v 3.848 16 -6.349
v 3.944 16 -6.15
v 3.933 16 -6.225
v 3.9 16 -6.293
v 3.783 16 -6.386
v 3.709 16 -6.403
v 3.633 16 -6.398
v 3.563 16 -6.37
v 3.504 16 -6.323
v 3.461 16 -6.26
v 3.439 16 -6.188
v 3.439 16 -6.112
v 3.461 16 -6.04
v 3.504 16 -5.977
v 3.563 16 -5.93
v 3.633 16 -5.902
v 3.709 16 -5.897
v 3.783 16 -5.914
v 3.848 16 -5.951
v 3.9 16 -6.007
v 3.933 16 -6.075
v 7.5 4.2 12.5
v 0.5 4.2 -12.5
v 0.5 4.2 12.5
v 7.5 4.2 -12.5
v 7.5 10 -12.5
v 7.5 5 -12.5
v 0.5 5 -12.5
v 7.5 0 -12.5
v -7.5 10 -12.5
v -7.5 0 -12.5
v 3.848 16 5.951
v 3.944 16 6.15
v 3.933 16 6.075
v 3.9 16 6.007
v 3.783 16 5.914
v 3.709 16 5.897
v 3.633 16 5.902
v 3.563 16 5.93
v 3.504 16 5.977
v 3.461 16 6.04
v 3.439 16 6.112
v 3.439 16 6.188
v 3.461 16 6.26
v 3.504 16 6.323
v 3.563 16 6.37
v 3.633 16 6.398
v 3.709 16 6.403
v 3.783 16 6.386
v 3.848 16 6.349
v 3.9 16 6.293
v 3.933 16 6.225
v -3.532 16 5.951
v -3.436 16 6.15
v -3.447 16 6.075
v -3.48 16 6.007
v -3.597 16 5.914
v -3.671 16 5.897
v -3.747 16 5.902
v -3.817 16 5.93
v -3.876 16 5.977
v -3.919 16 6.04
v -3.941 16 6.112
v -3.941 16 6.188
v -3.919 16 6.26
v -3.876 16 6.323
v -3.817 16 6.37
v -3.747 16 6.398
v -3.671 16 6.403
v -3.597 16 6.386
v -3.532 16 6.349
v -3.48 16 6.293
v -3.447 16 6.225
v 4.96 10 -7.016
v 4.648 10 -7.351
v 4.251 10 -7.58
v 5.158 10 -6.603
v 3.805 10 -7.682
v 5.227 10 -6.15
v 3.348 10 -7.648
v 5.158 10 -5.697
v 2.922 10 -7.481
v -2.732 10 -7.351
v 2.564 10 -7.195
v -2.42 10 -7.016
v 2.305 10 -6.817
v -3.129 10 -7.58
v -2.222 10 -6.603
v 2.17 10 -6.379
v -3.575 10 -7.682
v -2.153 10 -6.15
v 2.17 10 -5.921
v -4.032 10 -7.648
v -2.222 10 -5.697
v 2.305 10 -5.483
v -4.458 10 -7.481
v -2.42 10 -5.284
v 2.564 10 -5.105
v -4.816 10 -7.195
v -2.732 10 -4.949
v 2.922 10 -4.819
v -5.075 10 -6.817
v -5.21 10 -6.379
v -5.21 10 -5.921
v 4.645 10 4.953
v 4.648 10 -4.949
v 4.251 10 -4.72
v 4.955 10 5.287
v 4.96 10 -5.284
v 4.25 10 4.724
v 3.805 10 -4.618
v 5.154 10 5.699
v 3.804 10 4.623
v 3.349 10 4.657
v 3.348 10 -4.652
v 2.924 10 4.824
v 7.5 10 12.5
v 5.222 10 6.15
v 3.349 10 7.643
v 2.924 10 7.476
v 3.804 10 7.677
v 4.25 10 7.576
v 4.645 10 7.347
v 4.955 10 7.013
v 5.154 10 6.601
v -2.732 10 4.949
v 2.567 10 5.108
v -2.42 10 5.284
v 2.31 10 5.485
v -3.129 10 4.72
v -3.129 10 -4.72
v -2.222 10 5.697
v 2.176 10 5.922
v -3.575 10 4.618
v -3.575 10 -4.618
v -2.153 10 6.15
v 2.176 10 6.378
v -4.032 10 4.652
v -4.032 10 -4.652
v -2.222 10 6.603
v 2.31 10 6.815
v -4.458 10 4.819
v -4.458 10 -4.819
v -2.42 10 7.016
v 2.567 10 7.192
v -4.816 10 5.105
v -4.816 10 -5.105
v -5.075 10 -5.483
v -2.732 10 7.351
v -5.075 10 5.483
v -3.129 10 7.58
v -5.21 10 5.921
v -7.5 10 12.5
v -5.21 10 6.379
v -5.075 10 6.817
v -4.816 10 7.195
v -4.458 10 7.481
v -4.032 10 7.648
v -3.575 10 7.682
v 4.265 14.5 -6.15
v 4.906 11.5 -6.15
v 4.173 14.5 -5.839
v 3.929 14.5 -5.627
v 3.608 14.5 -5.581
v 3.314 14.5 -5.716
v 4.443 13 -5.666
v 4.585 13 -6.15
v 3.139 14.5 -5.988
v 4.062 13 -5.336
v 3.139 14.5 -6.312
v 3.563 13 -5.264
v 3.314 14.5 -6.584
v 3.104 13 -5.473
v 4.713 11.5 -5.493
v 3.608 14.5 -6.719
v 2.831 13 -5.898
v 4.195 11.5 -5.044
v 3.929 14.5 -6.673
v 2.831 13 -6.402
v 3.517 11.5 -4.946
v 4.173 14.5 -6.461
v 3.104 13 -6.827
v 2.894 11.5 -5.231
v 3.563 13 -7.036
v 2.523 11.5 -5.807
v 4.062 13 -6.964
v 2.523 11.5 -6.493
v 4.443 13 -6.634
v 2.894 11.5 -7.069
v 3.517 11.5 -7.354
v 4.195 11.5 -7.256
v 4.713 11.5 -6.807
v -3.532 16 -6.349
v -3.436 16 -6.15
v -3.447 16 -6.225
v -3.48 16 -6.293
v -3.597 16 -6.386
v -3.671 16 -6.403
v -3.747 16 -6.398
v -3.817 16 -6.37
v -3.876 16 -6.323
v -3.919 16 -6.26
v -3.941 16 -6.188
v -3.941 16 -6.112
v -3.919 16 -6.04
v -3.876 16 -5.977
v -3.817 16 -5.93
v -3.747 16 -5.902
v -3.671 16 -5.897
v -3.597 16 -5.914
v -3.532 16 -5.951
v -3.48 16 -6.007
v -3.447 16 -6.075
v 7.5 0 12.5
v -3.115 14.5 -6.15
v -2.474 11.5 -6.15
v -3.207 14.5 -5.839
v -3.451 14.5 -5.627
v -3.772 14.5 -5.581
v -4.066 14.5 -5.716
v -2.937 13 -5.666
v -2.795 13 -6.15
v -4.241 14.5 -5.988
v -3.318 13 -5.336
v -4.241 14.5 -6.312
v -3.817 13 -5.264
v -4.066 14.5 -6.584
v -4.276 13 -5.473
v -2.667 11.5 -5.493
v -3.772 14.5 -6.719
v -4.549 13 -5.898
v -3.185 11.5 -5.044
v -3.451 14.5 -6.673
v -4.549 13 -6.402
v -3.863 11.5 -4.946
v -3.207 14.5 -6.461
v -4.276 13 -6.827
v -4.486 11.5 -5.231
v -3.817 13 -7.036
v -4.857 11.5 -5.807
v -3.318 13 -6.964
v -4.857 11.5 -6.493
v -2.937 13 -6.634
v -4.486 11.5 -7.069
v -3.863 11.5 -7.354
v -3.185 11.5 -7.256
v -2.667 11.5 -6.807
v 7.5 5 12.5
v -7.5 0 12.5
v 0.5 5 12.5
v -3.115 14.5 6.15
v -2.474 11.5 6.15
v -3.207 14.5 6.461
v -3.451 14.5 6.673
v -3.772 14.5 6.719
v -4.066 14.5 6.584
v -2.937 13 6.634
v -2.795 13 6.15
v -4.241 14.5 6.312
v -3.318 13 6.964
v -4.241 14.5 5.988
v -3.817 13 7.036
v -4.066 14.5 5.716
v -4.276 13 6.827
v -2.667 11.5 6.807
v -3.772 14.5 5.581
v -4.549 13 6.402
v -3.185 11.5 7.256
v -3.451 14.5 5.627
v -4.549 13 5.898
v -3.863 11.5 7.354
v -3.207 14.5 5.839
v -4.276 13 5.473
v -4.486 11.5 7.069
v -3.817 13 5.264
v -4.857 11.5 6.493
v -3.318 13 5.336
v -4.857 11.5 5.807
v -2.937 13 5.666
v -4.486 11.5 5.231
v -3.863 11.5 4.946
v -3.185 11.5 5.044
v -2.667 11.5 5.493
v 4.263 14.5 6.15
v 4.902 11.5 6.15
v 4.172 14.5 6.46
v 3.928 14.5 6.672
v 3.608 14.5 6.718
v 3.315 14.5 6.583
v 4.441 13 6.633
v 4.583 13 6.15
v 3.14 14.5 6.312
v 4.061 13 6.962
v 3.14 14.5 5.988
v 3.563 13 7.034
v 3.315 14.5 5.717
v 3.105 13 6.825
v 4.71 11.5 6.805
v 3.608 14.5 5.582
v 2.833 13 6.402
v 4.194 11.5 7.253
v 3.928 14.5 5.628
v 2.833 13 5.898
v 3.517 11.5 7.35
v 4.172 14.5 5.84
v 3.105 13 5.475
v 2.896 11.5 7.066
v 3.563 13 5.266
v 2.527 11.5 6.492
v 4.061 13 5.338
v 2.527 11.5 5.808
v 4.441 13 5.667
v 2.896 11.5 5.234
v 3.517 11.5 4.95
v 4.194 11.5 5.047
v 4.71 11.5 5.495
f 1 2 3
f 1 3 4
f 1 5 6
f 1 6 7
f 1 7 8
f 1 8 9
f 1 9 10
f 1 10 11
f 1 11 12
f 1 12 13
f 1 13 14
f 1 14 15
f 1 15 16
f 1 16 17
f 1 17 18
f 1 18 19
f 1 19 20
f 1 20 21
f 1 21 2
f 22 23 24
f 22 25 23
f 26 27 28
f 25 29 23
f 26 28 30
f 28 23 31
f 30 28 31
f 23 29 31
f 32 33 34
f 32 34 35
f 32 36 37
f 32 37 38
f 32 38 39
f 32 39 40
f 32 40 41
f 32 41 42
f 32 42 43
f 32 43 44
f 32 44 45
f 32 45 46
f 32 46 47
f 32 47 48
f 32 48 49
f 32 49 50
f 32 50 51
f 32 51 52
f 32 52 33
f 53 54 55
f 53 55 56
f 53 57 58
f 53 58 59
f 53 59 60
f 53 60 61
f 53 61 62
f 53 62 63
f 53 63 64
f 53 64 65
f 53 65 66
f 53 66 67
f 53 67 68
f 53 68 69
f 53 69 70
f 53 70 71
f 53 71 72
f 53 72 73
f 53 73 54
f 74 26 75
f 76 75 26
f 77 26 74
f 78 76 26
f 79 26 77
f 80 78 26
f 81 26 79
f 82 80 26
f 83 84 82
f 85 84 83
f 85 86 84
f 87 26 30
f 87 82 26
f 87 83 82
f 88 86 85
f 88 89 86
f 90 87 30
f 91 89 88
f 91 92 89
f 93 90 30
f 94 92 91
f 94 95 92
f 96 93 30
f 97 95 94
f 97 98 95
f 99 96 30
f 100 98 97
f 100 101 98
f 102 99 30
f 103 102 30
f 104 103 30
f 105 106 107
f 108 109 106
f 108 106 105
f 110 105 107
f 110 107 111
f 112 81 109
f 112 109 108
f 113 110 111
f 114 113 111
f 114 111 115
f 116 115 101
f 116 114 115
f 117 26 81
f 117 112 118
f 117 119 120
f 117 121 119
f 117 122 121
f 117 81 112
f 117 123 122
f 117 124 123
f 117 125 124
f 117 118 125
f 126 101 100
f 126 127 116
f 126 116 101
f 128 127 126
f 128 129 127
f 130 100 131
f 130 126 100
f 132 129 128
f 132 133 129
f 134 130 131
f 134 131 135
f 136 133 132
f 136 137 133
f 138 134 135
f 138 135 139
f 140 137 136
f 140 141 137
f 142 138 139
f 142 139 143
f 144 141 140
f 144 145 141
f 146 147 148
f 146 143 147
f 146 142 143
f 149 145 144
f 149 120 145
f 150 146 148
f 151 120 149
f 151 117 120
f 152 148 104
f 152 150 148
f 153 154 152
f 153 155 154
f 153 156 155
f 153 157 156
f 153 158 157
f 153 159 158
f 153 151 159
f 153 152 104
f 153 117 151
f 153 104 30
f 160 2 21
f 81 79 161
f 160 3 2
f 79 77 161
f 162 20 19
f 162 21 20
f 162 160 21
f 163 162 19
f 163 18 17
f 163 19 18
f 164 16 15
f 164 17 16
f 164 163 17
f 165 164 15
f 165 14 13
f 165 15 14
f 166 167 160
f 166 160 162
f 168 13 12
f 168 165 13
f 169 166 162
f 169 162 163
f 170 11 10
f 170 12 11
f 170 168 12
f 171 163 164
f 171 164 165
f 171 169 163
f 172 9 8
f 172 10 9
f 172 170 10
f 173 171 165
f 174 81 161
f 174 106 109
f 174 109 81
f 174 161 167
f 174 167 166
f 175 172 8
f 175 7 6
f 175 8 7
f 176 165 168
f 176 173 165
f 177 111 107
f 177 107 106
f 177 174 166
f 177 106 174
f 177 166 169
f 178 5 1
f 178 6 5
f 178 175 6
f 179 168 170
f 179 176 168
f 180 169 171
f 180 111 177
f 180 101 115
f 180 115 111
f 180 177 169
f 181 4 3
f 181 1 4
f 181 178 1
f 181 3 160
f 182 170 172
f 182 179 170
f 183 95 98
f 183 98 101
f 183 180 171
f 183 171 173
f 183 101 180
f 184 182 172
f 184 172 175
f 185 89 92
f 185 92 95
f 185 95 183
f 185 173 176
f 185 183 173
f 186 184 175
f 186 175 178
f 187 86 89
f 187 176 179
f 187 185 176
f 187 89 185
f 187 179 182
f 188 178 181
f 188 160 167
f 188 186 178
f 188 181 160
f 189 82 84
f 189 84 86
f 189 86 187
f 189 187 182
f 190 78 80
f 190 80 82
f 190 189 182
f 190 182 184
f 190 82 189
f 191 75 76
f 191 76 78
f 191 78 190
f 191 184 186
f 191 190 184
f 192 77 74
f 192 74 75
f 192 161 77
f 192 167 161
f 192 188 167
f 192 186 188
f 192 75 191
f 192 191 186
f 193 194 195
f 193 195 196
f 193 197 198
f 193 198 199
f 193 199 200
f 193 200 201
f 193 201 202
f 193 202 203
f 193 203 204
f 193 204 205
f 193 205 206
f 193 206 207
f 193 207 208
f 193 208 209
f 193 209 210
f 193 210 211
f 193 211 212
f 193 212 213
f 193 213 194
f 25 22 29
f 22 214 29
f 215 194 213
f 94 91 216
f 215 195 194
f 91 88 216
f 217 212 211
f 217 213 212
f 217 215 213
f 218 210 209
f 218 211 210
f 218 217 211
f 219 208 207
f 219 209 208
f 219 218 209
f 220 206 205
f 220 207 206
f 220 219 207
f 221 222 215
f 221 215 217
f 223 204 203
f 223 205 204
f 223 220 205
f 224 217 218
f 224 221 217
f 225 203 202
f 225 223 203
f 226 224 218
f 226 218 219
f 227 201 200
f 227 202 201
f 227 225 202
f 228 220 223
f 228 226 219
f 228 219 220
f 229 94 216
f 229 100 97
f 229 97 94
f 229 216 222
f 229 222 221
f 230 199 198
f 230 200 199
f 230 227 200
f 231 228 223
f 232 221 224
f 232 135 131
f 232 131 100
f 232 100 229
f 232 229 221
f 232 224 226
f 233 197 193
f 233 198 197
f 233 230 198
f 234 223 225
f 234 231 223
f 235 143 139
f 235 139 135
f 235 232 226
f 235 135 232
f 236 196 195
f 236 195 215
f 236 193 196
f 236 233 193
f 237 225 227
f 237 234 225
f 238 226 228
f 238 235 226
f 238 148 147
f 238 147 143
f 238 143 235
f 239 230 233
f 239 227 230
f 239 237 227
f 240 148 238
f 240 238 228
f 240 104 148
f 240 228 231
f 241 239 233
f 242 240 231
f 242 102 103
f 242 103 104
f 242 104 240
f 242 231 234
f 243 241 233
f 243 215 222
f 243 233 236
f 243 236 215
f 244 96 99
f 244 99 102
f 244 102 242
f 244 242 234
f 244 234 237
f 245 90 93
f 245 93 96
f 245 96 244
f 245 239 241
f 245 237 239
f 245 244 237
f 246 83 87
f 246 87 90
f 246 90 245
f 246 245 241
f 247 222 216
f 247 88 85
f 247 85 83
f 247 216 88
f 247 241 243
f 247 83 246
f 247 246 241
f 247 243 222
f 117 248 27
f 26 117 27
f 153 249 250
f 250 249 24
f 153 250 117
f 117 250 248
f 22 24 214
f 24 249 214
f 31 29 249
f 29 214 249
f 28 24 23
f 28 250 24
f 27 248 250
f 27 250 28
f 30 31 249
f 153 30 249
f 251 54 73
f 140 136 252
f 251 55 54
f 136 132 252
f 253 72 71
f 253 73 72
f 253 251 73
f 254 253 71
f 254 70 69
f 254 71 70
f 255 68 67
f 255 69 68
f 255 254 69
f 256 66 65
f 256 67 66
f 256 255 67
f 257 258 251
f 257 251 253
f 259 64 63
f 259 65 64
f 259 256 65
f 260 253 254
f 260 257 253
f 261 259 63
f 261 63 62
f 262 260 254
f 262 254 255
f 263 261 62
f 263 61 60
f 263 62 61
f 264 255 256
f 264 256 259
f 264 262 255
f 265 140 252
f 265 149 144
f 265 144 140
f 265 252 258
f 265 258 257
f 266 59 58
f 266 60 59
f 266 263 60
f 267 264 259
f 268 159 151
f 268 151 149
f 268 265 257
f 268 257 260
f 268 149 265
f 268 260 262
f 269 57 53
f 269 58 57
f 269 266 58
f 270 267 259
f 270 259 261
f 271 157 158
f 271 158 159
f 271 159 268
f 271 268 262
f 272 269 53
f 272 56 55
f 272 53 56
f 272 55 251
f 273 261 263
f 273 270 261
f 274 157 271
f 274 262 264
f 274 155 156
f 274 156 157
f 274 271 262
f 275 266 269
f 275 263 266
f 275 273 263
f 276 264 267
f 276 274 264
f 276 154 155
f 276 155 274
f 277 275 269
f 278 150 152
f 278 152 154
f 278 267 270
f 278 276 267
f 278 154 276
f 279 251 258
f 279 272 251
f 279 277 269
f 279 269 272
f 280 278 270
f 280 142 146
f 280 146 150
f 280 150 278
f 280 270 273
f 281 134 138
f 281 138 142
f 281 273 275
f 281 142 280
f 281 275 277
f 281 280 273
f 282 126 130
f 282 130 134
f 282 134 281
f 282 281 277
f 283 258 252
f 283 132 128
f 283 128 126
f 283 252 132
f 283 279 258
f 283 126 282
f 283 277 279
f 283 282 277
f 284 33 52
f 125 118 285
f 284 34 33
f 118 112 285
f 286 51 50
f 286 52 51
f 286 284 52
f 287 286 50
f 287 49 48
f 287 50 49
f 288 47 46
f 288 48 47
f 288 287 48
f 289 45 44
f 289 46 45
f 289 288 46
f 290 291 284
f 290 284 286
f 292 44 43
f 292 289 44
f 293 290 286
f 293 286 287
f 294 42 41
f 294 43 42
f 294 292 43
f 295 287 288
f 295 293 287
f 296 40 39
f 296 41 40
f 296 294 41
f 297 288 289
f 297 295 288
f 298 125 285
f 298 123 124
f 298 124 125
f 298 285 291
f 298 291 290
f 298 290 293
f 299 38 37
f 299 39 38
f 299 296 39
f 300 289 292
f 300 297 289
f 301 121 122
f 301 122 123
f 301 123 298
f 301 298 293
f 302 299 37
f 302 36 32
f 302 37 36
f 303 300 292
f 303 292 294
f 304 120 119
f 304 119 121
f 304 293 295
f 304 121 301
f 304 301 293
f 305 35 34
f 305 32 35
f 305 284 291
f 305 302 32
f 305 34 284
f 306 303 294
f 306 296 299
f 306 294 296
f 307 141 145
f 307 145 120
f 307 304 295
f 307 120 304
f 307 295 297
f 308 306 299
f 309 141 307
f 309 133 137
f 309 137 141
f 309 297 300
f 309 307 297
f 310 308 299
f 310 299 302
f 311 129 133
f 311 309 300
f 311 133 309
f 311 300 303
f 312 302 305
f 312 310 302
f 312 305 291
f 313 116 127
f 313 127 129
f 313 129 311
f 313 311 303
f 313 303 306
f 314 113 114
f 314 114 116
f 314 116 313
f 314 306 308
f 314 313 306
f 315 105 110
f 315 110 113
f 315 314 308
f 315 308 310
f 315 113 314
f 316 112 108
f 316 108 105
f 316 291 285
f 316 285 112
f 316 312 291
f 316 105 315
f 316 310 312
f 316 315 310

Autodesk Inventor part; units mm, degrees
ref_plane "YZ Plane" through (0, 0, 0) normal (1, 0, 0) x (0, 1, 0)
ref_plane "XZ Plane" through (0, 0, 0) normal (0, 1, 0) x (-1, 0, 0)
ref_plane "XY Plane" through (0, 0, 0) normal (0, 0, 1) x (1, 0, 0)
sketch "Sketch1" plane through (0, 0, 0) normal (0, 1, 0) x (-1, 0, 0)
  line L0 (7.5, 12.5) -> (-7.5, 12.5)
  line L1 (-7.5, 12.5) -> (-7.5, -12.5)
  line L2 (-7.5, -12.5) -> (7.5, -12.5)
  line L3 (7.5, -12.5) -> (7.5, 12.5)
  point P0 (0, 0)
  dimension "d0" = 25
  dimension "d1" = 15
  dimension "d2" = 7.5
  dimension "d3" = 12.5
extrude "Extrusion1" add sketch "Sketch1" along normal blind 10
sketch "Sketch3" plane through (7.5, 0, 12.5) normal (1, 0, 0) x (0, 0, -1)
  line L0 (0, 0) -> (0, 10) projected
  line L1 (0, 5) -> (25, 5)
  line L2 (25, 5) -> (25, 4.2)
  line L3 (25, 4.2) -> (0, 4.2)
  line L4 (0, 4.2) -> (0, 5)
  point P0 (12.5, 0)
  dimension "d8" = 0.8
  dimension "d9" = 25
extrude "Extrusion2" cut sketch "Sketch3" against normal blind 7
sketch "Sketch4" plane through (0, 10, 0) normal (0, 1, 0) x (1, 0, 0)
  circle A0 centre (3.69, -6.15) radius 1.5316
  line L0 (-7.5, -12.5) -> (7.5, -12.5) projected
  line L1 (7.5, -12.5) -> (7.5, 12.5) projected
  circle A1 centre (-3.69, -6.15) radius 1.5367
  line L2 (-7.5, 12.5) -> (-7.5, -12.5) projected
  point P0 (0, 0)
  dimension "d12" = 6.35
  dimension "d13" = 3.81
  dimension "d14" = 3.0631
  dimension "d15" = 3.81
  dimension "d16" = 3.0734
  dimension "d17" = 6.35
sketch "Sketch5" plane through (0, 10, 0) normal (0, 1, 0) x (1, 0, 0)
  circle A0 centre (3.69, 6.15) radius 1.5367
  circle A1 centre (-3.69, 6.15) radius 1.5367
  line L0 (7.5, 12.5) -> (-7.5, 12.5) projected
  line L1 (-7.5, 12.5) -> (-7.5, -12.5) projected
  line L2 (7.5, -12.5) -> (7.5, 12.5) projected
  point P0 (0, 0)
  dimension "d18" = 6.35
  dimension "d19" = 6.35
  dimension "d20" = 3.81
  dimension "d21" = 3.81
  dimension "d22" = 3.0734
  dimension "d23" = 3.0734
ref_plane "Work Plane1" through (0, 16, 0) normal (0, 1, 0) x (1, 0, 0)
sketch "Sketch6" plane through (0, 16, 0) normal (0, 1, 0) x (1, 0, 0)
  circle A0 centre (3.69, 6.15) radius 0.254
  line L0 (7.5, 12.5) -> (-7.5, 12.5) projected
  line L1 (7.5, -12.5) -> (7.5, 12.5) projected
  point P0 (0, 0)
  dimension "d41" = 0.508
  dimension "d42" = 6.35
  dimension "d43" = 3.81
loft "Loft1" add profiles "Sketch6", "Sketch5" contours all / A0
sketch "Sketch7" plane through (0, 16, 0) normal (0, 1, 0) x (1, 0, 0)
  circle A0 centre (3.69, -6.15) radius 0.254
  line L0 (7.5, -12.5) -> (7.5, 12.5) projected
  line L1 (-7.5, -12.5) -> (7.5, -12.5) projected
  point P0 (0, 0)
  dimension "d44" = 0.508
  dimension "d45" = 3.81
  dimension "d46" = 6.35
loft "Loft2" add profiles "Sketch4", "Sketch7" contours A0 / all
sketch "Sketch10" plane through (0, 16, 0) normal (0, 1, 0) x (1, 0, 0)
  circle A0 centre (-3.69, -6.15) radius 0.254
  line L0 (-7.5, 12.5) -> (-7.5, -12.5) projected
  line L1 (-7.5, -12.5) -> (7.5, -12.5) projected
  point P0 (0, 0)
  dimension "d53" = 3.81
  dimension "d54" = 6.35
  dimension "d55" = 0.508
loft "Loft3" add profiles "Sketch4", "Sketch10" contours A1 / all
sketch "Sketch11" plane through (0, 16, 0) normal (0, 1, 0) x (1, 0, 0)
  circle A0 centre (-3.69, 6.15) radius 0.254
  line L0 (-7.5, 12.5) -> (-7.5, -12.5) projected
  line L1 (7.5, 12.5) -> (-7.5, 12.5) projected
  point P0 (0, 0)
  dimension "d60" = 0.508
  dimension "d61" = 3.81
  dimension "d62" = 6.35
loft "Loft4" add profiles "Sketch5", "Sketch11" contours A1 / all
properties part number "_3DPrint"
